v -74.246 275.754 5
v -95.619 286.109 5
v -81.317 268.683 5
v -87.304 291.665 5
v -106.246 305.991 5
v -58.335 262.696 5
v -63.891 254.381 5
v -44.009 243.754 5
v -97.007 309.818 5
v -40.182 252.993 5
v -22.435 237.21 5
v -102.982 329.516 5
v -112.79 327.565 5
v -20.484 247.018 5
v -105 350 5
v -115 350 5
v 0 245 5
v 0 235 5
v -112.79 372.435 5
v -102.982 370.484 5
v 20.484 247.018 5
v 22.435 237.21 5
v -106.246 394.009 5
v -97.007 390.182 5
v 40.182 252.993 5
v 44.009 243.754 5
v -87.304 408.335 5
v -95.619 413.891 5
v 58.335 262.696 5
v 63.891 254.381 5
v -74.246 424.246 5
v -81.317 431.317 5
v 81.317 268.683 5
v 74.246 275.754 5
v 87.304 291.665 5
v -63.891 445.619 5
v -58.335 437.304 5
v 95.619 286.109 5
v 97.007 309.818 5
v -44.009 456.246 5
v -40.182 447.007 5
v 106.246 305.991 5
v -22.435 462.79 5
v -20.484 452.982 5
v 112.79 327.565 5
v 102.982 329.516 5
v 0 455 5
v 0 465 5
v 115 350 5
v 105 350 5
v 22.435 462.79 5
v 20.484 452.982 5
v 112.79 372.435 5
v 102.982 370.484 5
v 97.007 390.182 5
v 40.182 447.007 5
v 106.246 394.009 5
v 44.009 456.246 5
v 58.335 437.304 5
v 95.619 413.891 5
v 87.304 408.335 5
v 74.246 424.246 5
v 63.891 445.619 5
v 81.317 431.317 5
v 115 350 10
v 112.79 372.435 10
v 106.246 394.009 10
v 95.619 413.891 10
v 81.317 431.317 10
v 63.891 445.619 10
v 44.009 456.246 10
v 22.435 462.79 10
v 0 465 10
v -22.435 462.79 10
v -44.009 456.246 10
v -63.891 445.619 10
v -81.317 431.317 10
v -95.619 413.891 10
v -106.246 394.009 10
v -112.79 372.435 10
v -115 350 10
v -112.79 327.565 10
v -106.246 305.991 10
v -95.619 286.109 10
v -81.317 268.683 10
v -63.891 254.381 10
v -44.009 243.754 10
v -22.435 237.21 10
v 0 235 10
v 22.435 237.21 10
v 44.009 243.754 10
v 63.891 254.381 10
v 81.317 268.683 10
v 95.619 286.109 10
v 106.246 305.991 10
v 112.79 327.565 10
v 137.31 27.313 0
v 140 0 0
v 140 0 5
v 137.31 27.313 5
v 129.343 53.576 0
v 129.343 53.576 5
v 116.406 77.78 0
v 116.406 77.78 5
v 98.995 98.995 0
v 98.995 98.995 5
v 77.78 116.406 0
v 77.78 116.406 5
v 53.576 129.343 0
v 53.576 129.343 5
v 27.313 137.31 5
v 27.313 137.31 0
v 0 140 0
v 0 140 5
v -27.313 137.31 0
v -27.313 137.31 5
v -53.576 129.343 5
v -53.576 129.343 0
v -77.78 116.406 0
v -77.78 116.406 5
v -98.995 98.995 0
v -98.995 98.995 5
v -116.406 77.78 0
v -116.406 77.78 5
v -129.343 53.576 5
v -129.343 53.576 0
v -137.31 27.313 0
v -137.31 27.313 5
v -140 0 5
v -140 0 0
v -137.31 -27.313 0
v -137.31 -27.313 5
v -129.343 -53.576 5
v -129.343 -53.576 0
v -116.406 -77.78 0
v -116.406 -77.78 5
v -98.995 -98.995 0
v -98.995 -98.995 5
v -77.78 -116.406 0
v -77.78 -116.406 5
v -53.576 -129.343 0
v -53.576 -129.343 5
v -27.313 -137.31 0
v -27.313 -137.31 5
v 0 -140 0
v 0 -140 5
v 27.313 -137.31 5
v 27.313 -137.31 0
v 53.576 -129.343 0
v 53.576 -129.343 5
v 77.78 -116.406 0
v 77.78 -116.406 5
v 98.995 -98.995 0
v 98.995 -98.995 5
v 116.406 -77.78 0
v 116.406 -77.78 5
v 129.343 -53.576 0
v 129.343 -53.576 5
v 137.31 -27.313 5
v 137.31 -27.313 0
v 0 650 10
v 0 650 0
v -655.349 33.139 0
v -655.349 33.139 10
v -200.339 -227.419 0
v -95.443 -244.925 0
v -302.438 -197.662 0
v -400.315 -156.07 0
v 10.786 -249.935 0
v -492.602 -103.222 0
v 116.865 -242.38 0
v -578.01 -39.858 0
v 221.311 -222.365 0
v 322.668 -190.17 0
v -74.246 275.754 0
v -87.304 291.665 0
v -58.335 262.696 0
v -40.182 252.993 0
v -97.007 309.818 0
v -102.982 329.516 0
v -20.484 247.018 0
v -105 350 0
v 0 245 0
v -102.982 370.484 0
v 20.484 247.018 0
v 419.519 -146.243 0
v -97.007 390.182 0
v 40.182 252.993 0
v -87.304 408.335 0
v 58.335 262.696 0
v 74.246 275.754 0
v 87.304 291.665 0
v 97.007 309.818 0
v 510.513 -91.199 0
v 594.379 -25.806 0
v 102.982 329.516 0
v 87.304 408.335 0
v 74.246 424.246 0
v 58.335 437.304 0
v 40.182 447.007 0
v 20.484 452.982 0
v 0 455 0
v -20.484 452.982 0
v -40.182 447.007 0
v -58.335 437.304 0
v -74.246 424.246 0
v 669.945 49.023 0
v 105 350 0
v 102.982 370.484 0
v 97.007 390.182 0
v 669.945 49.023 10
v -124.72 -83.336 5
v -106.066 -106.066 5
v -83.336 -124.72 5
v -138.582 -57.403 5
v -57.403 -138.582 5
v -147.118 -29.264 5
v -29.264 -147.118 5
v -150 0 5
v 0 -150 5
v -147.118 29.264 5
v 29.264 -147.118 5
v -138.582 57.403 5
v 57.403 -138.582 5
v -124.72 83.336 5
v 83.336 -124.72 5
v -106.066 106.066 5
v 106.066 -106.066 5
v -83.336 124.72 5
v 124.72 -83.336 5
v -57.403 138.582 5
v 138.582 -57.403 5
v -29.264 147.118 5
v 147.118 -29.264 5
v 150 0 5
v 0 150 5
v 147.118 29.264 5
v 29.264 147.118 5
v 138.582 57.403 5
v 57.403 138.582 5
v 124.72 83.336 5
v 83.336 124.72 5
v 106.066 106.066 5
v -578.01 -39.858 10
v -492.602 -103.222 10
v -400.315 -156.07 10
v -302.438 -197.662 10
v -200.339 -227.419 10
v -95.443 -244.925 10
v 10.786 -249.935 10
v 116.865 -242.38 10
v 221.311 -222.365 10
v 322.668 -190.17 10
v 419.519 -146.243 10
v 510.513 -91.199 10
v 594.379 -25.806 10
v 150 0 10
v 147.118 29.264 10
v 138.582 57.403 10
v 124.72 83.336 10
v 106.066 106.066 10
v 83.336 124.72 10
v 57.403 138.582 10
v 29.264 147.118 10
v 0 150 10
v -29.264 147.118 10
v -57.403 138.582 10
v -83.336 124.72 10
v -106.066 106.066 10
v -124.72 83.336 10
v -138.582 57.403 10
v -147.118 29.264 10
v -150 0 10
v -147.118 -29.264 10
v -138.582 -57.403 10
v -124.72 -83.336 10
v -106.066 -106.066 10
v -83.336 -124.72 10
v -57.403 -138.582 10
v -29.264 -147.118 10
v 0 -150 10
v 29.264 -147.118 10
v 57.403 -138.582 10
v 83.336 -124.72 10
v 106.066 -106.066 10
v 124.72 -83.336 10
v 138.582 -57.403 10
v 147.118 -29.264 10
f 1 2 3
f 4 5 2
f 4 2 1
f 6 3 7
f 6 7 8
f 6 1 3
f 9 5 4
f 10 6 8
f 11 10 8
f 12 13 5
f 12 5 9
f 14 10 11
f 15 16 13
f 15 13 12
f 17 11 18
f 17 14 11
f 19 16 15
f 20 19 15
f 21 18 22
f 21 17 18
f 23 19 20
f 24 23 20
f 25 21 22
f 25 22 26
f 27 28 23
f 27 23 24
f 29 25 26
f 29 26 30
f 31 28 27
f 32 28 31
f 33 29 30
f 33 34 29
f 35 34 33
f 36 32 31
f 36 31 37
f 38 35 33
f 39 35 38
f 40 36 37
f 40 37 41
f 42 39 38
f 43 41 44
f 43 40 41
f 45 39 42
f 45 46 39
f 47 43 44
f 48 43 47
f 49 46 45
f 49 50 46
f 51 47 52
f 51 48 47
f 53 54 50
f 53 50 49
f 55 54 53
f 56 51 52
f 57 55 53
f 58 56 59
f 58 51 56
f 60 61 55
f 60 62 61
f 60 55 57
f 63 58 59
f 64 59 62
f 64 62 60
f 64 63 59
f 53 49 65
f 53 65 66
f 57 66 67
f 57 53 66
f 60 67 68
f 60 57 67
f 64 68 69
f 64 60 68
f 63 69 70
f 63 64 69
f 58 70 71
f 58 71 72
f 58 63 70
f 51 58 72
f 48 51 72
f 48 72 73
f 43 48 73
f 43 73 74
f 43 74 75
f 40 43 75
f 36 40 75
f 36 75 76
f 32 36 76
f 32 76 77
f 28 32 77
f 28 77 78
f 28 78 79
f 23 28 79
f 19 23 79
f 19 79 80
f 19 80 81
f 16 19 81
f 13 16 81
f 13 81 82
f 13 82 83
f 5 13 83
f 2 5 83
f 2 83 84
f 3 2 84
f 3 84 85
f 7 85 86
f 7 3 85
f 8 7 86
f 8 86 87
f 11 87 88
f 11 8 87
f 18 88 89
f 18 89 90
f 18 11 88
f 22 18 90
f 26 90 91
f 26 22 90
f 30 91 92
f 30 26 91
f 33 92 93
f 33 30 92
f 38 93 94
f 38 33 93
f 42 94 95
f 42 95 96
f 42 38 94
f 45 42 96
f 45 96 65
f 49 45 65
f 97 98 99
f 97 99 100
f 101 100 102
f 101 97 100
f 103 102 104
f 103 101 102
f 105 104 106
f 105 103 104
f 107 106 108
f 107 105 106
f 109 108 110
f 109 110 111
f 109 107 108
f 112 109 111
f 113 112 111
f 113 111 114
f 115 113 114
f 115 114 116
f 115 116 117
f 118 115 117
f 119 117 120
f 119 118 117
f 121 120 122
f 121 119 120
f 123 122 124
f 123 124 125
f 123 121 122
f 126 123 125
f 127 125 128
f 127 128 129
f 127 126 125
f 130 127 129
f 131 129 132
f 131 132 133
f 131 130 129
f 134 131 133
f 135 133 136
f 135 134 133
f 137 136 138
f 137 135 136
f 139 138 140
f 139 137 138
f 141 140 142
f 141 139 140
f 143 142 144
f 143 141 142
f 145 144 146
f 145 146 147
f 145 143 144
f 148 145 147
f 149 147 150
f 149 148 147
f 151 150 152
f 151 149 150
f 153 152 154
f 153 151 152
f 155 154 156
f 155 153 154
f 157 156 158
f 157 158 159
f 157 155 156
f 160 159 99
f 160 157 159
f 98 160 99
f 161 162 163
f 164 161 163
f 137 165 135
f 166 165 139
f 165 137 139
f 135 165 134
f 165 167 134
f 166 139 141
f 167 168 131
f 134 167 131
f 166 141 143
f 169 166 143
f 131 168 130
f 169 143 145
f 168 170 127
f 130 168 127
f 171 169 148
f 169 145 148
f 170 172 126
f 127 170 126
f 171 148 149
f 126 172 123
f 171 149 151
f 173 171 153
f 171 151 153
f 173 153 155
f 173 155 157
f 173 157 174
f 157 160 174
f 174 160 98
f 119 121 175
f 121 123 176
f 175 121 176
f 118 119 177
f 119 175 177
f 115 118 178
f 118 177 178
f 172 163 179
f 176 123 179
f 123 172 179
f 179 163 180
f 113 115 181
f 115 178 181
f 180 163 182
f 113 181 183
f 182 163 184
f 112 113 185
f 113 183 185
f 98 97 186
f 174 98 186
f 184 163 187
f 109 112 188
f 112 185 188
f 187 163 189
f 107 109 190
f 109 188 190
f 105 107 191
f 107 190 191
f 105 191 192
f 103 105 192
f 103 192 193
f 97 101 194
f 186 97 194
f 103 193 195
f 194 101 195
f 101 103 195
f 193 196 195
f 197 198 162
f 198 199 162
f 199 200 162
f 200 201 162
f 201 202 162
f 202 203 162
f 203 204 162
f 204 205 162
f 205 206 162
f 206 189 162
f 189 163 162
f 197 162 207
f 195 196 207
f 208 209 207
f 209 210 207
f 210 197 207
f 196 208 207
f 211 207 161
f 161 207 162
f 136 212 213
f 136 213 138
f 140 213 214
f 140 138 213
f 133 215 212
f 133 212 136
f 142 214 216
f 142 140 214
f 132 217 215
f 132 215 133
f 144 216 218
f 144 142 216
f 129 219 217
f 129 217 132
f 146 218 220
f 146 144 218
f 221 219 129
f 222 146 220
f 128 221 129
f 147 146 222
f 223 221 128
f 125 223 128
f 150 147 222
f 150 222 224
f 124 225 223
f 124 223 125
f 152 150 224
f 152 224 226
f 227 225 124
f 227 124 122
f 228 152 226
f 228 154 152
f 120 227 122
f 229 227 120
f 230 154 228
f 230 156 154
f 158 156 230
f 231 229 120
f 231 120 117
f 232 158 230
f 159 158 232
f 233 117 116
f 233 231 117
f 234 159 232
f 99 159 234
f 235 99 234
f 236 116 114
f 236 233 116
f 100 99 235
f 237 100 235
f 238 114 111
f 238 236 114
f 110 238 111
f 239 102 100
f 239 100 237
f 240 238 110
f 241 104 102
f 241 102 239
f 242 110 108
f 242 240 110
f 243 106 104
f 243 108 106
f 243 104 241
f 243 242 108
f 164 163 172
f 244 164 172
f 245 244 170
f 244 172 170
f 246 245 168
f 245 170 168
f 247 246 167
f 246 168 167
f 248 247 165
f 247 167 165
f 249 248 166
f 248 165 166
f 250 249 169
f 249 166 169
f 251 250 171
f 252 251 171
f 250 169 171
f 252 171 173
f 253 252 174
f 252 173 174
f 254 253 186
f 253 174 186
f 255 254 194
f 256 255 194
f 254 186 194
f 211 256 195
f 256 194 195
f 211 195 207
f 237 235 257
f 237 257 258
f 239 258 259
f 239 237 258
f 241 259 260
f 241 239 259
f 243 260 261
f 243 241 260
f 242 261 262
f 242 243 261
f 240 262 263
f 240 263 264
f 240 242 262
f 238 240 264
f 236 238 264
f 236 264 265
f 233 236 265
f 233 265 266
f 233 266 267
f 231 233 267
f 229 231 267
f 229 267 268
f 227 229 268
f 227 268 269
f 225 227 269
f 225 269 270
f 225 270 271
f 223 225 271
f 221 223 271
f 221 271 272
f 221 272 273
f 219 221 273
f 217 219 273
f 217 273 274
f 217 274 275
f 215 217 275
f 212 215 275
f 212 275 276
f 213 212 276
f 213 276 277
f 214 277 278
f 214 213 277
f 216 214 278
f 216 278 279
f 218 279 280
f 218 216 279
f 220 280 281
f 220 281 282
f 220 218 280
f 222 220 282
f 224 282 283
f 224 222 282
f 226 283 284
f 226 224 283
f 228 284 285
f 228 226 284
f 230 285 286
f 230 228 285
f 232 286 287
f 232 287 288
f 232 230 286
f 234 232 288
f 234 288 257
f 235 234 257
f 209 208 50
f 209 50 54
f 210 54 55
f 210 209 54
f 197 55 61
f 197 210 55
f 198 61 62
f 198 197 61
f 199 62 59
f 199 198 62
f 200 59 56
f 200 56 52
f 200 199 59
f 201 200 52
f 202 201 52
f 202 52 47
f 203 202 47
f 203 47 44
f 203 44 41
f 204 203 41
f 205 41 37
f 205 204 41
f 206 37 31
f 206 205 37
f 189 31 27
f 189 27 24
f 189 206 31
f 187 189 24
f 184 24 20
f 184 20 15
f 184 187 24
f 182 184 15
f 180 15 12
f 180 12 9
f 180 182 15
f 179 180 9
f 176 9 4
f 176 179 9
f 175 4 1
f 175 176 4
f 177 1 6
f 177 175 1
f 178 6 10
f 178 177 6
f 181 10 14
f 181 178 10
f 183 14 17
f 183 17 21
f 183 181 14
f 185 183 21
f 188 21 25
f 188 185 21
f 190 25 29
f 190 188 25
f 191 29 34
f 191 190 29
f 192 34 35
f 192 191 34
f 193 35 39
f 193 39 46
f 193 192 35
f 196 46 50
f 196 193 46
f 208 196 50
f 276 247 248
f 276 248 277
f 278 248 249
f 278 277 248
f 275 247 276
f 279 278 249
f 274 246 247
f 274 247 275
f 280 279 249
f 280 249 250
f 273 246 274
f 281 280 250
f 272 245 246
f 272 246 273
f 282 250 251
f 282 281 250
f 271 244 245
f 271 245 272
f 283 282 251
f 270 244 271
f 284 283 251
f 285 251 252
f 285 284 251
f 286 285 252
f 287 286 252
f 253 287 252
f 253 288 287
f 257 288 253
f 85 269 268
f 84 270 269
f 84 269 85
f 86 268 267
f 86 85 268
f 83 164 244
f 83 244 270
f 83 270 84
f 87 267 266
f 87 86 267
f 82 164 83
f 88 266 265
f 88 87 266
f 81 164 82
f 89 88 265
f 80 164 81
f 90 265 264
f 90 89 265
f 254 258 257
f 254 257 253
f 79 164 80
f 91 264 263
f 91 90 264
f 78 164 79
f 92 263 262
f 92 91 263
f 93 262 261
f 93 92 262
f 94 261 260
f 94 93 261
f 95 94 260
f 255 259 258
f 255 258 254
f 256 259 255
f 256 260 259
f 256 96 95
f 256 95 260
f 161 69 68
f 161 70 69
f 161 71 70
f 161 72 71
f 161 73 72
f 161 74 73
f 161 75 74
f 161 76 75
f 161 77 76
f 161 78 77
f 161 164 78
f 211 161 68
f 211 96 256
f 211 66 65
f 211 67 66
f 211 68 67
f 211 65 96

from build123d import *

# Parameters (mm, degrees)
F0_R     = 150
F0_R_2   = 115
F1_DEPTH = 10
F0_R_3   = 140
F0_R_4   = 105
F2_DEPTH = 5


with BuildPart() as f1:
    # F0 (on Top) → F1 (new body)
    with BuildSketch(Plane.XY):
        with BuildLine():
            ThreePointArc((-655.34883, 33.138662), (10.786254, -249.935363), (669.945337, 49.023091))
            Line((669.945337, 49.023091), (0, 650))
            Line((0, 650), (-655.34883, 33.138662))
        make_face()
        Circle(F0_R, mode=Mode.SUBTRACT)
        with Locations((0, 350)):
            Circle(F0_R_2, mode=Mode.SUBTRACT)
    extrude(amount=F1_DEPTH)

    # F0 (on Top) → F2 (join)
    with BuildSketch(Plane.XY):
        Circle(F0_R)
        Circle(F0_R_3, mode=Mode.SUBTRACT)
        with Locations((0, 350)):
            Circle(F0_R_2)
        with Locations((0, 350)):
            Circle(F0_R_4, mode=Mode.SUBTRACT)
    extrude(amount=F2_DEPTH)


solid = f1.part
